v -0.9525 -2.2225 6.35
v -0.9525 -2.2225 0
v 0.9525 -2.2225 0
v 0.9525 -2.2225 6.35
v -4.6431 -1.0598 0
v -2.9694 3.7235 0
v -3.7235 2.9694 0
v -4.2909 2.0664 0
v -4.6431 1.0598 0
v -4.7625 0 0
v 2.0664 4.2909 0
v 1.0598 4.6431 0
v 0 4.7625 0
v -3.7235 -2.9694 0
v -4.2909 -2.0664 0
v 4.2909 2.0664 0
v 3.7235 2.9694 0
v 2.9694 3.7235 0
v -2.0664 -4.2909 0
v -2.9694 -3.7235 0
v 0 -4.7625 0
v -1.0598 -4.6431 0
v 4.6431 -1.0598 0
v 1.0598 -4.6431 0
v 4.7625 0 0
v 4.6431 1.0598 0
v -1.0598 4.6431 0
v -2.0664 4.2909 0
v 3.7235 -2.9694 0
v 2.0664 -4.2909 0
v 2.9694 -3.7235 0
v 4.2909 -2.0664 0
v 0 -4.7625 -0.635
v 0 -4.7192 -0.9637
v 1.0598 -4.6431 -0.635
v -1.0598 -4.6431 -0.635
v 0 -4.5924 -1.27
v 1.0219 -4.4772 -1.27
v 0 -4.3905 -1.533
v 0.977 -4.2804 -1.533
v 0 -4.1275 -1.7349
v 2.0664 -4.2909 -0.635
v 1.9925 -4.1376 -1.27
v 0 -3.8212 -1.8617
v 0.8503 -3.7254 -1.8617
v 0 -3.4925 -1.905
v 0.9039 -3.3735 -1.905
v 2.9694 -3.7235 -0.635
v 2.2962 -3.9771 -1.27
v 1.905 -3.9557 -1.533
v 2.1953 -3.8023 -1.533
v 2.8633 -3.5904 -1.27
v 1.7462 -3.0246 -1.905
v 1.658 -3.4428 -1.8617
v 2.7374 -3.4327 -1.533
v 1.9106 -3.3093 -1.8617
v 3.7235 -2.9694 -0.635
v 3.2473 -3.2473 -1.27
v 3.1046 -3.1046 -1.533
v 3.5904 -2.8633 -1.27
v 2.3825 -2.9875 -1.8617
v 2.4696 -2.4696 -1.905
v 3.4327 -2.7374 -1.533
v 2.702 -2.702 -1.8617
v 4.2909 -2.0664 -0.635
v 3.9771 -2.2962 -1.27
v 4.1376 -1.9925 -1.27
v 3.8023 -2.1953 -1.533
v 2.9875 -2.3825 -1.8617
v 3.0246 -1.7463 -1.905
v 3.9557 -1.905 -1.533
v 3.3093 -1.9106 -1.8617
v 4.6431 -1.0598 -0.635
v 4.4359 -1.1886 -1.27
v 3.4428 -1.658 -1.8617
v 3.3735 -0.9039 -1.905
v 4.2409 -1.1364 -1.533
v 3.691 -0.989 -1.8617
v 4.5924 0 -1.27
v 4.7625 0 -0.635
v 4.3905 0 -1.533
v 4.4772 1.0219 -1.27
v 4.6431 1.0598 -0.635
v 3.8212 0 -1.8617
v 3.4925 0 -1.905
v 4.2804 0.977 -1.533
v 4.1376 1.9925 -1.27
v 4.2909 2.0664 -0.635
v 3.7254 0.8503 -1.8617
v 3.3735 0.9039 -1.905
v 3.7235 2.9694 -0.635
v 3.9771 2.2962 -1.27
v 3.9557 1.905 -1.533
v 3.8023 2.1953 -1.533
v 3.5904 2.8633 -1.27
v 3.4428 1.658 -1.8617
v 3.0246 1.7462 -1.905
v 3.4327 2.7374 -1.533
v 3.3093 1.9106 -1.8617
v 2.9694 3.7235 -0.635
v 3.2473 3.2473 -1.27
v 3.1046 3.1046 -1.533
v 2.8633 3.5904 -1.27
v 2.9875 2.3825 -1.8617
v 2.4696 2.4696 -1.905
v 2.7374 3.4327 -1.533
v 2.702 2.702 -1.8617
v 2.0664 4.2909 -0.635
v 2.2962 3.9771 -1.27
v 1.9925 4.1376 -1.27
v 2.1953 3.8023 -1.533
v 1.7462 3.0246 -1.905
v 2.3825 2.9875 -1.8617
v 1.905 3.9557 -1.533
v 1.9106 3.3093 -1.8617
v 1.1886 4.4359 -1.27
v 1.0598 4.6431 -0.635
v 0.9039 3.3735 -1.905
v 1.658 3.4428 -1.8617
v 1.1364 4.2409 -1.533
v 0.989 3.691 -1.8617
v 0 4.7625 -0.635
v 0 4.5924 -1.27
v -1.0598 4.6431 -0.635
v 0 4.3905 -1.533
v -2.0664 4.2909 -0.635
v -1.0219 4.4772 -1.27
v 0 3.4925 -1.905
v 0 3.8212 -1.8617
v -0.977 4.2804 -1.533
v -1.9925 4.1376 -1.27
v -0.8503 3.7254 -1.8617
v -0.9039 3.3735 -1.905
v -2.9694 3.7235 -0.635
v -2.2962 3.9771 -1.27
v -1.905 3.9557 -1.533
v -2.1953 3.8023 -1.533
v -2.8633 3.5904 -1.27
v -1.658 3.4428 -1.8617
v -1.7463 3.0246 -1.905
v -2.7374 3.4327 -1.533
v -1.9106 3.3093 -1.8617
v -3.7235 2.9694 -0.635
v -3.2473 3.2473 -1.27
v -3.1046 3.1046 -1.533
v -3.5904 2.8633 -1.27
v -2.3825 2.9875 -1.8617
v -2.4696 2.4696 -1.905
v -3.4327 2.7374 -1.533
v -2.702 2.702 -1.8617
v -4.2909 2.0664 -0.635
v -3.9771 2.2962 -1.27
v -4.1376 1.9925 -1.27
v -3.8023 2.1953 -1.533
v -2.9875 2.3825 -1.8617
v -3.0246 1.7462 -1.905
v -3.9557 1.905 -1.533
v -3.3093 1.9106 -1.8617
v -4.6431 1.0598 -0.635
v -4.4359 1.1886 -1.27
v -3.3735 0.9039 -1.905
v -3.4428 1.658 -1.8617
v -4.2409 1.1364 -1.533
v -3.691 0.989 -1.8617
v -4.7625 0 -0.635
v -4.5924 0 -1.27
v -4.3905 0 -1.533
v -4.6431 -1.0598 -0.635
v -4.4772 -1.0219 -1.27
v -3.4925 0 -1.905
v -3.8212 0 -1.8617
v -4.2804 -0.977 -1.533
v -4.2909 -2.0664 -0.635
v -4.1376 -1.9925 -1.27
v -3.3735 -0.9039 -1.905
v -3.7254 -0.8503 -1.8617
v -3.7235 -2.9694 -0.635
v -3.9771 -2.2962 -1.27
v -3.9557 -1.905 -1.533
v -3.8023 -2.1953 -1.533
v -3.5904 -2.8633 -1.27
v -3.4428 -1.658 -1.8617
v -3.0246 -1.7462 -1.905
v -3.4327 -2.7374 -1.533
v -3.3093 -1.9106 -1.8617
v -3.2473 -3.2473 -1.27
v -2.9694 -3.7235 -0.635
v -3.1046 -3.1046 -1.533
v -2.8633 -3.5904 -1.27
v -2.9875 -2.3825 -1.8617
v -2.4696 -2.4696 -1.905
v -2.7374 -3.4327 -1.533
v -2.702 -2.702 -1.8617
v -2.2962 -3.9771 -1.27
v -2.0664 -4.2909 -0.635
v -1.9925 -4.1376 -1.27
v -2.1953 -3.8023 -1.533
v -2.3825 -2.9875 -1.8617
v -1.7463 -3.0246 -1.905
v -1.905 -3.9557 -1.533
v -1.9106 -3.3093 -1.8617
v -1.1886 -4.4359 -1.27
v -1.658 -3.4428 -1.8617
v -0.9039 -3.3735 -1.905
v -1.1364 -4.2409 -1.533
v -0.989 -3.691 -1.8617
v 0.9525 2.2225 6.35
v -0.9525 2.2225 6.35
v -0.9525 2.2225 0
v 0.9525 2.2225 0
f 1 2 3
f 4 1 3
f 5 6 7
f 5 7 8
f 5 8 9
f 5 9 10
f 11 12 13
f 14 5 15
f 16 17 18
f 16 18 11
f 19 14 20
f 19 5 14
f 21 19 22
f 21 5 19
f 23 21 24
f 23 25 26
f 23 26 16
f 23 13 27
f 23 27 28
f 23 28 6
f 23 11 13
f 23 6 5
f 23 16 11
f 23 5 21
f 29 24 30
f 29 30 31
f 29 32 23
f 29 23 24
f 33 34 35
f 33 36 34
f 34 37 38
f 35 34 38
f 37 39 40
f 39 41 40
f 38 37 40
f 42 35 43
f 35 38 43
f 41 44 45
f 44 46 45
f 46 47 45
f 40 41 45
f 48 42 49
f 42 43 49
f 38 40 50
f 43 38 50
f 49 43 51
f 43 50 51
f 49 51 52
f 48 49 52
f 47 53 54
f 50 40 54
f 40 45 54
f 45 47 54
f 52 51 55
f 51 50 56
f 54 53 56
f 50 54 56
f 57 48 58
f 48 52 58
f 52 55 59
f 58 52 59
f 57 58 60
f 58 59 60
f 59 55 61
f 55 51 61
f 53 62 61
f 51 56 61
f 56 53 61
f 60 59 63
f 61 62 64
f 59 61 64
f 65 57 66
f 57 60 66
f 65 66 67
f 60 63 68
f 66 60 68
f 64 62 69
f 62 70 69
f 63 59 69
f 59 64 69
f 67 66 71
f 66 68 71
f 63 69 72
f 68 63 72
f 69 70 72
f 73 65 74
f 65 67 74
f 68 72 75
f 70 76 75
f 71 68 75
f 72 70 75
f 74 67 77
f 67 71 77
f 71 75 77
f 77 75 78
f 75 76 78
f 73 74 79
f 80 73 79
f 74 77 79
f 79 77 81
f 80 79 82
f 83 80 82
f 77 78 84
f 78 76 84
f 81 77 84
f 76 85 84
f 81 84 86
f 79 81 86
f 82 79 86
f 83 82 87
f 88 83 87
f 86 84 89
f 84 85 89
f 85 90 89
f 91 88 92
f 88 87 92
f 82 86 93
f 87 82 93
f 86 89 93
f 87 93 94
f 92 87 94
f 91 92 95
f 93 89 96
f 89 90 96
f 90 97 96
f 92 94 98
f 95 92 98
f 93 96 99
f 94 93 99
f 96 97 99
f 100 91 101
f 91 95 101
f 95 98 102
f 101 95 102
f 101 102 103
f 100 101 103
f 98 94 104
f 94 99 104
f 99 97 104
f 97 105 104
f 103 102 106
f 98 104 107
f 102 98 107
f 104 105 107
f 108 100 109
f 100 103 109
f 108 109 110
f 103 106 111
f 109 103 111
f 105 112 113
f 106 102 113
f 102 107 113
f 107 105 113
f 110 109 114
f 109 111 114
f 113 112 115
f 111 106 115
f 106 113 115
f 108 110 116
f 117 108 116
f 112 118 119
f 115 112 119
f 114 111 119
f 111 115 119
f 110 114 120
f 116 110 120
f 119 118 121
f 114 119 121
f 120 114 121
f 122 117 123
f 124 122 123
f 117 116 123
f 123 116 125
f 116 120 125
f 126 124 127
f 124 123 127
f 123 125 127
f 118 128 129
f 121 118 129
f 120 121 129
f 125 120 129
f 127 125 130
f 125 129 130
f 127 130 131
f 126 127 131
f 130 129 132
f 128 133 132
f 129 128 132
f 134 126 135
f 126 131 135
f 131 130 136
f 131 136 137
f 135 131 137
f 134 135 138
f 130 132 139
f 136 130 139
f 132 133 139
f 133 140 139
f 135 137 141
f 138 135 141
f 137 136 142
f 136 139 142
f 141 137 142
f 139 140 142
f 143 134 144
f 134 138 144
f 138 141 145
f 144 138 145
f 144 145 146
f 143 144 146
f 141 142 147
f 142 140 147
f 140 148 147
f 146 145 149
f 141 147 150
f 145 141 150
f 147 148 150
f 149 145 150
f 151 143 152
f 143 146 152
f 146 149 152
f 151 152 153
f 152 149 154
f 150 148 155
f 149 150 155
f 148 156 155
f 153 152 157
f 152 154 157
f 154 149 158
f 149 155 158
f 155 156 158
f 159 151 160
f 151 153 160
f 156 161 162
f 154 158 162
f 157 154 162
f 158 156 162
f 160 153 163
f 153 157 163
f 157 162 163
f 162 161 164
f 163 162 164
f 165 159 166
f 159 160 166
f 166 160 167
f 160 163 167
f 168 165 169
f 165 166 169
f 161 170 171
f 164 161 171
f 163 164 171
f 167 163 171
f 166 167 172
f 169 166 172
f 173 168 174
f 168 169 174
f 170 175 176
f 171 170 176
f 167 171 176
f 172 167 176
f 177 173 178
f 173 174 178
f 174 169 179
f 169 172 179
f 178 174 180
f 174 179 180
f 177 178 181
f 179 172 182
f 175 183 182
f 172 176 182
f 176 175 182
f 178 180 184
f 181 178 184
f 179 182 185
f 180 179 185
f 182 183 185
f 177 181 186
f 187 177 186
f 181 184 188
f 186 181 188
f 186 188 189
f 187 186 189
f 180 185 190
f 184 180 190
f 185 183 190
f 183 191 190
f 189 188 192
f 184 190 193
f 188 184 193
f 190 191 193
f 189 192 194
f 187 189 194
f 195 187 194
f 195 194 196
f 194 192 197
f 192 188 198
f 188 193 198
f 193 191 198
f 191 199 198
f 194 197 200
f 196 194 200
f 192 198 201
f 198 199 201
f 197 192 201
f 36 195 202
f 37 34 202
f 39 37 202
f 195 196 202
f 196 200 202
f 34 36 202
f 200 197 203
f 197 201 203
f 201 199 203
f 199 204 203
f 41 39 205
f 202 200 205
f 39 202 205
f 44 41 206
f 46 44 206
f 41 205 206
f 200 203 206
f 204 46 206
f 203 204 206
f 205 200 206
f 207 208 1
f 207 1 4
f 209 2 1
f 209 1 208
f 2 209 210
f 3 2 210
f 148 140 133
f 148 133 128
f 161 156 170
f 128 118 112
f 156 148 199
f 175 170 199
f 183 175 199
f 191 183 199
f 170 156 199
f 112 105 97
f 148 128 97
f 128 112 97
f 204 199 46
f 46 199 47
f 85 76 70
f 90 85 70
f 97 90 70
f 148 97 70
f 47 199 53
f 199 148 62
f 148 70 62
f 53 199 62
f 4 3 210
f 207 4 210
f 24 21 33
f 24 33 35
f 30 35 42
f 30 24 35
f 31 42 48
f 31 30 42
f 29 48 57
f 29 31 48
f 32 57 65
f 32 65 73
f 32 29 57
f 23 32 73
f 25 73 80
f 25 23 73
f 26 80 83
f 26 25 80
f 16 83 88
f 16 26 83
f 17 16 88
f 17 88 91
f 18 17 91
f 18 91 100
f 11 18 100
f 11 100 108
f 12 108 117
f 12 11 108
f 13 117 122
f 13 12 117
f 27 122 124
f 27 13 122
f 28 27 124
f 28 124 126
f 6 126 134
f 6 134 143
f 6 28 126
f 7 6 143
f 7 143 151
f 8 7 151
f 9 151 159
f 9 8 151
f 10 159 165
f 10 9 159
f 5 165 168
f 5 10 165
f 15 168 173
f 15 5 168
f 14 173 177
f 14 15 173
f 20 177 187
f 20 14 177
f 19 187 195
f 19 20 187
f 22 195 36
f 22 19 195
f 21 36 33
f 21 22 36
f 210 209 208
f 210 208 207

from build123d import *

# Parameters (mm, degrees)
F0_W     = 4.7625
F0_H     = 1.905
F2_W     = 1.905
F2_H     = 4.445
F3_DEPTH = 6.35
F4_R     = 1.27


with BuildPart() as f1:
    # F0 (on Right) → F1 (revolve)
    with BuildSketch(Plane.YZ):
        with Locations((-2.38125, -0.9525)):
            Rectangle(F0_W, F0_H)
    revolve(axis=Axis((0, 0, -0.9525), (0, 0, 1)))

    # F4
    f4_edges = [f1.edges().sort_by_distance(p)[0] for p in [
        (0, 4.7625, -1.905),
    ]]
    fillet(f4_edges, radius=F4_R)


with BuildPart() as f3:
    # F2 (on face) → F3 (new body)
    with BuildSketch(Plane.XY):
        Rectangle(F2_W, F2_H)
    extrude(amount=F3_DEPTH)


solid = Compound([f1.part, f3.part])
